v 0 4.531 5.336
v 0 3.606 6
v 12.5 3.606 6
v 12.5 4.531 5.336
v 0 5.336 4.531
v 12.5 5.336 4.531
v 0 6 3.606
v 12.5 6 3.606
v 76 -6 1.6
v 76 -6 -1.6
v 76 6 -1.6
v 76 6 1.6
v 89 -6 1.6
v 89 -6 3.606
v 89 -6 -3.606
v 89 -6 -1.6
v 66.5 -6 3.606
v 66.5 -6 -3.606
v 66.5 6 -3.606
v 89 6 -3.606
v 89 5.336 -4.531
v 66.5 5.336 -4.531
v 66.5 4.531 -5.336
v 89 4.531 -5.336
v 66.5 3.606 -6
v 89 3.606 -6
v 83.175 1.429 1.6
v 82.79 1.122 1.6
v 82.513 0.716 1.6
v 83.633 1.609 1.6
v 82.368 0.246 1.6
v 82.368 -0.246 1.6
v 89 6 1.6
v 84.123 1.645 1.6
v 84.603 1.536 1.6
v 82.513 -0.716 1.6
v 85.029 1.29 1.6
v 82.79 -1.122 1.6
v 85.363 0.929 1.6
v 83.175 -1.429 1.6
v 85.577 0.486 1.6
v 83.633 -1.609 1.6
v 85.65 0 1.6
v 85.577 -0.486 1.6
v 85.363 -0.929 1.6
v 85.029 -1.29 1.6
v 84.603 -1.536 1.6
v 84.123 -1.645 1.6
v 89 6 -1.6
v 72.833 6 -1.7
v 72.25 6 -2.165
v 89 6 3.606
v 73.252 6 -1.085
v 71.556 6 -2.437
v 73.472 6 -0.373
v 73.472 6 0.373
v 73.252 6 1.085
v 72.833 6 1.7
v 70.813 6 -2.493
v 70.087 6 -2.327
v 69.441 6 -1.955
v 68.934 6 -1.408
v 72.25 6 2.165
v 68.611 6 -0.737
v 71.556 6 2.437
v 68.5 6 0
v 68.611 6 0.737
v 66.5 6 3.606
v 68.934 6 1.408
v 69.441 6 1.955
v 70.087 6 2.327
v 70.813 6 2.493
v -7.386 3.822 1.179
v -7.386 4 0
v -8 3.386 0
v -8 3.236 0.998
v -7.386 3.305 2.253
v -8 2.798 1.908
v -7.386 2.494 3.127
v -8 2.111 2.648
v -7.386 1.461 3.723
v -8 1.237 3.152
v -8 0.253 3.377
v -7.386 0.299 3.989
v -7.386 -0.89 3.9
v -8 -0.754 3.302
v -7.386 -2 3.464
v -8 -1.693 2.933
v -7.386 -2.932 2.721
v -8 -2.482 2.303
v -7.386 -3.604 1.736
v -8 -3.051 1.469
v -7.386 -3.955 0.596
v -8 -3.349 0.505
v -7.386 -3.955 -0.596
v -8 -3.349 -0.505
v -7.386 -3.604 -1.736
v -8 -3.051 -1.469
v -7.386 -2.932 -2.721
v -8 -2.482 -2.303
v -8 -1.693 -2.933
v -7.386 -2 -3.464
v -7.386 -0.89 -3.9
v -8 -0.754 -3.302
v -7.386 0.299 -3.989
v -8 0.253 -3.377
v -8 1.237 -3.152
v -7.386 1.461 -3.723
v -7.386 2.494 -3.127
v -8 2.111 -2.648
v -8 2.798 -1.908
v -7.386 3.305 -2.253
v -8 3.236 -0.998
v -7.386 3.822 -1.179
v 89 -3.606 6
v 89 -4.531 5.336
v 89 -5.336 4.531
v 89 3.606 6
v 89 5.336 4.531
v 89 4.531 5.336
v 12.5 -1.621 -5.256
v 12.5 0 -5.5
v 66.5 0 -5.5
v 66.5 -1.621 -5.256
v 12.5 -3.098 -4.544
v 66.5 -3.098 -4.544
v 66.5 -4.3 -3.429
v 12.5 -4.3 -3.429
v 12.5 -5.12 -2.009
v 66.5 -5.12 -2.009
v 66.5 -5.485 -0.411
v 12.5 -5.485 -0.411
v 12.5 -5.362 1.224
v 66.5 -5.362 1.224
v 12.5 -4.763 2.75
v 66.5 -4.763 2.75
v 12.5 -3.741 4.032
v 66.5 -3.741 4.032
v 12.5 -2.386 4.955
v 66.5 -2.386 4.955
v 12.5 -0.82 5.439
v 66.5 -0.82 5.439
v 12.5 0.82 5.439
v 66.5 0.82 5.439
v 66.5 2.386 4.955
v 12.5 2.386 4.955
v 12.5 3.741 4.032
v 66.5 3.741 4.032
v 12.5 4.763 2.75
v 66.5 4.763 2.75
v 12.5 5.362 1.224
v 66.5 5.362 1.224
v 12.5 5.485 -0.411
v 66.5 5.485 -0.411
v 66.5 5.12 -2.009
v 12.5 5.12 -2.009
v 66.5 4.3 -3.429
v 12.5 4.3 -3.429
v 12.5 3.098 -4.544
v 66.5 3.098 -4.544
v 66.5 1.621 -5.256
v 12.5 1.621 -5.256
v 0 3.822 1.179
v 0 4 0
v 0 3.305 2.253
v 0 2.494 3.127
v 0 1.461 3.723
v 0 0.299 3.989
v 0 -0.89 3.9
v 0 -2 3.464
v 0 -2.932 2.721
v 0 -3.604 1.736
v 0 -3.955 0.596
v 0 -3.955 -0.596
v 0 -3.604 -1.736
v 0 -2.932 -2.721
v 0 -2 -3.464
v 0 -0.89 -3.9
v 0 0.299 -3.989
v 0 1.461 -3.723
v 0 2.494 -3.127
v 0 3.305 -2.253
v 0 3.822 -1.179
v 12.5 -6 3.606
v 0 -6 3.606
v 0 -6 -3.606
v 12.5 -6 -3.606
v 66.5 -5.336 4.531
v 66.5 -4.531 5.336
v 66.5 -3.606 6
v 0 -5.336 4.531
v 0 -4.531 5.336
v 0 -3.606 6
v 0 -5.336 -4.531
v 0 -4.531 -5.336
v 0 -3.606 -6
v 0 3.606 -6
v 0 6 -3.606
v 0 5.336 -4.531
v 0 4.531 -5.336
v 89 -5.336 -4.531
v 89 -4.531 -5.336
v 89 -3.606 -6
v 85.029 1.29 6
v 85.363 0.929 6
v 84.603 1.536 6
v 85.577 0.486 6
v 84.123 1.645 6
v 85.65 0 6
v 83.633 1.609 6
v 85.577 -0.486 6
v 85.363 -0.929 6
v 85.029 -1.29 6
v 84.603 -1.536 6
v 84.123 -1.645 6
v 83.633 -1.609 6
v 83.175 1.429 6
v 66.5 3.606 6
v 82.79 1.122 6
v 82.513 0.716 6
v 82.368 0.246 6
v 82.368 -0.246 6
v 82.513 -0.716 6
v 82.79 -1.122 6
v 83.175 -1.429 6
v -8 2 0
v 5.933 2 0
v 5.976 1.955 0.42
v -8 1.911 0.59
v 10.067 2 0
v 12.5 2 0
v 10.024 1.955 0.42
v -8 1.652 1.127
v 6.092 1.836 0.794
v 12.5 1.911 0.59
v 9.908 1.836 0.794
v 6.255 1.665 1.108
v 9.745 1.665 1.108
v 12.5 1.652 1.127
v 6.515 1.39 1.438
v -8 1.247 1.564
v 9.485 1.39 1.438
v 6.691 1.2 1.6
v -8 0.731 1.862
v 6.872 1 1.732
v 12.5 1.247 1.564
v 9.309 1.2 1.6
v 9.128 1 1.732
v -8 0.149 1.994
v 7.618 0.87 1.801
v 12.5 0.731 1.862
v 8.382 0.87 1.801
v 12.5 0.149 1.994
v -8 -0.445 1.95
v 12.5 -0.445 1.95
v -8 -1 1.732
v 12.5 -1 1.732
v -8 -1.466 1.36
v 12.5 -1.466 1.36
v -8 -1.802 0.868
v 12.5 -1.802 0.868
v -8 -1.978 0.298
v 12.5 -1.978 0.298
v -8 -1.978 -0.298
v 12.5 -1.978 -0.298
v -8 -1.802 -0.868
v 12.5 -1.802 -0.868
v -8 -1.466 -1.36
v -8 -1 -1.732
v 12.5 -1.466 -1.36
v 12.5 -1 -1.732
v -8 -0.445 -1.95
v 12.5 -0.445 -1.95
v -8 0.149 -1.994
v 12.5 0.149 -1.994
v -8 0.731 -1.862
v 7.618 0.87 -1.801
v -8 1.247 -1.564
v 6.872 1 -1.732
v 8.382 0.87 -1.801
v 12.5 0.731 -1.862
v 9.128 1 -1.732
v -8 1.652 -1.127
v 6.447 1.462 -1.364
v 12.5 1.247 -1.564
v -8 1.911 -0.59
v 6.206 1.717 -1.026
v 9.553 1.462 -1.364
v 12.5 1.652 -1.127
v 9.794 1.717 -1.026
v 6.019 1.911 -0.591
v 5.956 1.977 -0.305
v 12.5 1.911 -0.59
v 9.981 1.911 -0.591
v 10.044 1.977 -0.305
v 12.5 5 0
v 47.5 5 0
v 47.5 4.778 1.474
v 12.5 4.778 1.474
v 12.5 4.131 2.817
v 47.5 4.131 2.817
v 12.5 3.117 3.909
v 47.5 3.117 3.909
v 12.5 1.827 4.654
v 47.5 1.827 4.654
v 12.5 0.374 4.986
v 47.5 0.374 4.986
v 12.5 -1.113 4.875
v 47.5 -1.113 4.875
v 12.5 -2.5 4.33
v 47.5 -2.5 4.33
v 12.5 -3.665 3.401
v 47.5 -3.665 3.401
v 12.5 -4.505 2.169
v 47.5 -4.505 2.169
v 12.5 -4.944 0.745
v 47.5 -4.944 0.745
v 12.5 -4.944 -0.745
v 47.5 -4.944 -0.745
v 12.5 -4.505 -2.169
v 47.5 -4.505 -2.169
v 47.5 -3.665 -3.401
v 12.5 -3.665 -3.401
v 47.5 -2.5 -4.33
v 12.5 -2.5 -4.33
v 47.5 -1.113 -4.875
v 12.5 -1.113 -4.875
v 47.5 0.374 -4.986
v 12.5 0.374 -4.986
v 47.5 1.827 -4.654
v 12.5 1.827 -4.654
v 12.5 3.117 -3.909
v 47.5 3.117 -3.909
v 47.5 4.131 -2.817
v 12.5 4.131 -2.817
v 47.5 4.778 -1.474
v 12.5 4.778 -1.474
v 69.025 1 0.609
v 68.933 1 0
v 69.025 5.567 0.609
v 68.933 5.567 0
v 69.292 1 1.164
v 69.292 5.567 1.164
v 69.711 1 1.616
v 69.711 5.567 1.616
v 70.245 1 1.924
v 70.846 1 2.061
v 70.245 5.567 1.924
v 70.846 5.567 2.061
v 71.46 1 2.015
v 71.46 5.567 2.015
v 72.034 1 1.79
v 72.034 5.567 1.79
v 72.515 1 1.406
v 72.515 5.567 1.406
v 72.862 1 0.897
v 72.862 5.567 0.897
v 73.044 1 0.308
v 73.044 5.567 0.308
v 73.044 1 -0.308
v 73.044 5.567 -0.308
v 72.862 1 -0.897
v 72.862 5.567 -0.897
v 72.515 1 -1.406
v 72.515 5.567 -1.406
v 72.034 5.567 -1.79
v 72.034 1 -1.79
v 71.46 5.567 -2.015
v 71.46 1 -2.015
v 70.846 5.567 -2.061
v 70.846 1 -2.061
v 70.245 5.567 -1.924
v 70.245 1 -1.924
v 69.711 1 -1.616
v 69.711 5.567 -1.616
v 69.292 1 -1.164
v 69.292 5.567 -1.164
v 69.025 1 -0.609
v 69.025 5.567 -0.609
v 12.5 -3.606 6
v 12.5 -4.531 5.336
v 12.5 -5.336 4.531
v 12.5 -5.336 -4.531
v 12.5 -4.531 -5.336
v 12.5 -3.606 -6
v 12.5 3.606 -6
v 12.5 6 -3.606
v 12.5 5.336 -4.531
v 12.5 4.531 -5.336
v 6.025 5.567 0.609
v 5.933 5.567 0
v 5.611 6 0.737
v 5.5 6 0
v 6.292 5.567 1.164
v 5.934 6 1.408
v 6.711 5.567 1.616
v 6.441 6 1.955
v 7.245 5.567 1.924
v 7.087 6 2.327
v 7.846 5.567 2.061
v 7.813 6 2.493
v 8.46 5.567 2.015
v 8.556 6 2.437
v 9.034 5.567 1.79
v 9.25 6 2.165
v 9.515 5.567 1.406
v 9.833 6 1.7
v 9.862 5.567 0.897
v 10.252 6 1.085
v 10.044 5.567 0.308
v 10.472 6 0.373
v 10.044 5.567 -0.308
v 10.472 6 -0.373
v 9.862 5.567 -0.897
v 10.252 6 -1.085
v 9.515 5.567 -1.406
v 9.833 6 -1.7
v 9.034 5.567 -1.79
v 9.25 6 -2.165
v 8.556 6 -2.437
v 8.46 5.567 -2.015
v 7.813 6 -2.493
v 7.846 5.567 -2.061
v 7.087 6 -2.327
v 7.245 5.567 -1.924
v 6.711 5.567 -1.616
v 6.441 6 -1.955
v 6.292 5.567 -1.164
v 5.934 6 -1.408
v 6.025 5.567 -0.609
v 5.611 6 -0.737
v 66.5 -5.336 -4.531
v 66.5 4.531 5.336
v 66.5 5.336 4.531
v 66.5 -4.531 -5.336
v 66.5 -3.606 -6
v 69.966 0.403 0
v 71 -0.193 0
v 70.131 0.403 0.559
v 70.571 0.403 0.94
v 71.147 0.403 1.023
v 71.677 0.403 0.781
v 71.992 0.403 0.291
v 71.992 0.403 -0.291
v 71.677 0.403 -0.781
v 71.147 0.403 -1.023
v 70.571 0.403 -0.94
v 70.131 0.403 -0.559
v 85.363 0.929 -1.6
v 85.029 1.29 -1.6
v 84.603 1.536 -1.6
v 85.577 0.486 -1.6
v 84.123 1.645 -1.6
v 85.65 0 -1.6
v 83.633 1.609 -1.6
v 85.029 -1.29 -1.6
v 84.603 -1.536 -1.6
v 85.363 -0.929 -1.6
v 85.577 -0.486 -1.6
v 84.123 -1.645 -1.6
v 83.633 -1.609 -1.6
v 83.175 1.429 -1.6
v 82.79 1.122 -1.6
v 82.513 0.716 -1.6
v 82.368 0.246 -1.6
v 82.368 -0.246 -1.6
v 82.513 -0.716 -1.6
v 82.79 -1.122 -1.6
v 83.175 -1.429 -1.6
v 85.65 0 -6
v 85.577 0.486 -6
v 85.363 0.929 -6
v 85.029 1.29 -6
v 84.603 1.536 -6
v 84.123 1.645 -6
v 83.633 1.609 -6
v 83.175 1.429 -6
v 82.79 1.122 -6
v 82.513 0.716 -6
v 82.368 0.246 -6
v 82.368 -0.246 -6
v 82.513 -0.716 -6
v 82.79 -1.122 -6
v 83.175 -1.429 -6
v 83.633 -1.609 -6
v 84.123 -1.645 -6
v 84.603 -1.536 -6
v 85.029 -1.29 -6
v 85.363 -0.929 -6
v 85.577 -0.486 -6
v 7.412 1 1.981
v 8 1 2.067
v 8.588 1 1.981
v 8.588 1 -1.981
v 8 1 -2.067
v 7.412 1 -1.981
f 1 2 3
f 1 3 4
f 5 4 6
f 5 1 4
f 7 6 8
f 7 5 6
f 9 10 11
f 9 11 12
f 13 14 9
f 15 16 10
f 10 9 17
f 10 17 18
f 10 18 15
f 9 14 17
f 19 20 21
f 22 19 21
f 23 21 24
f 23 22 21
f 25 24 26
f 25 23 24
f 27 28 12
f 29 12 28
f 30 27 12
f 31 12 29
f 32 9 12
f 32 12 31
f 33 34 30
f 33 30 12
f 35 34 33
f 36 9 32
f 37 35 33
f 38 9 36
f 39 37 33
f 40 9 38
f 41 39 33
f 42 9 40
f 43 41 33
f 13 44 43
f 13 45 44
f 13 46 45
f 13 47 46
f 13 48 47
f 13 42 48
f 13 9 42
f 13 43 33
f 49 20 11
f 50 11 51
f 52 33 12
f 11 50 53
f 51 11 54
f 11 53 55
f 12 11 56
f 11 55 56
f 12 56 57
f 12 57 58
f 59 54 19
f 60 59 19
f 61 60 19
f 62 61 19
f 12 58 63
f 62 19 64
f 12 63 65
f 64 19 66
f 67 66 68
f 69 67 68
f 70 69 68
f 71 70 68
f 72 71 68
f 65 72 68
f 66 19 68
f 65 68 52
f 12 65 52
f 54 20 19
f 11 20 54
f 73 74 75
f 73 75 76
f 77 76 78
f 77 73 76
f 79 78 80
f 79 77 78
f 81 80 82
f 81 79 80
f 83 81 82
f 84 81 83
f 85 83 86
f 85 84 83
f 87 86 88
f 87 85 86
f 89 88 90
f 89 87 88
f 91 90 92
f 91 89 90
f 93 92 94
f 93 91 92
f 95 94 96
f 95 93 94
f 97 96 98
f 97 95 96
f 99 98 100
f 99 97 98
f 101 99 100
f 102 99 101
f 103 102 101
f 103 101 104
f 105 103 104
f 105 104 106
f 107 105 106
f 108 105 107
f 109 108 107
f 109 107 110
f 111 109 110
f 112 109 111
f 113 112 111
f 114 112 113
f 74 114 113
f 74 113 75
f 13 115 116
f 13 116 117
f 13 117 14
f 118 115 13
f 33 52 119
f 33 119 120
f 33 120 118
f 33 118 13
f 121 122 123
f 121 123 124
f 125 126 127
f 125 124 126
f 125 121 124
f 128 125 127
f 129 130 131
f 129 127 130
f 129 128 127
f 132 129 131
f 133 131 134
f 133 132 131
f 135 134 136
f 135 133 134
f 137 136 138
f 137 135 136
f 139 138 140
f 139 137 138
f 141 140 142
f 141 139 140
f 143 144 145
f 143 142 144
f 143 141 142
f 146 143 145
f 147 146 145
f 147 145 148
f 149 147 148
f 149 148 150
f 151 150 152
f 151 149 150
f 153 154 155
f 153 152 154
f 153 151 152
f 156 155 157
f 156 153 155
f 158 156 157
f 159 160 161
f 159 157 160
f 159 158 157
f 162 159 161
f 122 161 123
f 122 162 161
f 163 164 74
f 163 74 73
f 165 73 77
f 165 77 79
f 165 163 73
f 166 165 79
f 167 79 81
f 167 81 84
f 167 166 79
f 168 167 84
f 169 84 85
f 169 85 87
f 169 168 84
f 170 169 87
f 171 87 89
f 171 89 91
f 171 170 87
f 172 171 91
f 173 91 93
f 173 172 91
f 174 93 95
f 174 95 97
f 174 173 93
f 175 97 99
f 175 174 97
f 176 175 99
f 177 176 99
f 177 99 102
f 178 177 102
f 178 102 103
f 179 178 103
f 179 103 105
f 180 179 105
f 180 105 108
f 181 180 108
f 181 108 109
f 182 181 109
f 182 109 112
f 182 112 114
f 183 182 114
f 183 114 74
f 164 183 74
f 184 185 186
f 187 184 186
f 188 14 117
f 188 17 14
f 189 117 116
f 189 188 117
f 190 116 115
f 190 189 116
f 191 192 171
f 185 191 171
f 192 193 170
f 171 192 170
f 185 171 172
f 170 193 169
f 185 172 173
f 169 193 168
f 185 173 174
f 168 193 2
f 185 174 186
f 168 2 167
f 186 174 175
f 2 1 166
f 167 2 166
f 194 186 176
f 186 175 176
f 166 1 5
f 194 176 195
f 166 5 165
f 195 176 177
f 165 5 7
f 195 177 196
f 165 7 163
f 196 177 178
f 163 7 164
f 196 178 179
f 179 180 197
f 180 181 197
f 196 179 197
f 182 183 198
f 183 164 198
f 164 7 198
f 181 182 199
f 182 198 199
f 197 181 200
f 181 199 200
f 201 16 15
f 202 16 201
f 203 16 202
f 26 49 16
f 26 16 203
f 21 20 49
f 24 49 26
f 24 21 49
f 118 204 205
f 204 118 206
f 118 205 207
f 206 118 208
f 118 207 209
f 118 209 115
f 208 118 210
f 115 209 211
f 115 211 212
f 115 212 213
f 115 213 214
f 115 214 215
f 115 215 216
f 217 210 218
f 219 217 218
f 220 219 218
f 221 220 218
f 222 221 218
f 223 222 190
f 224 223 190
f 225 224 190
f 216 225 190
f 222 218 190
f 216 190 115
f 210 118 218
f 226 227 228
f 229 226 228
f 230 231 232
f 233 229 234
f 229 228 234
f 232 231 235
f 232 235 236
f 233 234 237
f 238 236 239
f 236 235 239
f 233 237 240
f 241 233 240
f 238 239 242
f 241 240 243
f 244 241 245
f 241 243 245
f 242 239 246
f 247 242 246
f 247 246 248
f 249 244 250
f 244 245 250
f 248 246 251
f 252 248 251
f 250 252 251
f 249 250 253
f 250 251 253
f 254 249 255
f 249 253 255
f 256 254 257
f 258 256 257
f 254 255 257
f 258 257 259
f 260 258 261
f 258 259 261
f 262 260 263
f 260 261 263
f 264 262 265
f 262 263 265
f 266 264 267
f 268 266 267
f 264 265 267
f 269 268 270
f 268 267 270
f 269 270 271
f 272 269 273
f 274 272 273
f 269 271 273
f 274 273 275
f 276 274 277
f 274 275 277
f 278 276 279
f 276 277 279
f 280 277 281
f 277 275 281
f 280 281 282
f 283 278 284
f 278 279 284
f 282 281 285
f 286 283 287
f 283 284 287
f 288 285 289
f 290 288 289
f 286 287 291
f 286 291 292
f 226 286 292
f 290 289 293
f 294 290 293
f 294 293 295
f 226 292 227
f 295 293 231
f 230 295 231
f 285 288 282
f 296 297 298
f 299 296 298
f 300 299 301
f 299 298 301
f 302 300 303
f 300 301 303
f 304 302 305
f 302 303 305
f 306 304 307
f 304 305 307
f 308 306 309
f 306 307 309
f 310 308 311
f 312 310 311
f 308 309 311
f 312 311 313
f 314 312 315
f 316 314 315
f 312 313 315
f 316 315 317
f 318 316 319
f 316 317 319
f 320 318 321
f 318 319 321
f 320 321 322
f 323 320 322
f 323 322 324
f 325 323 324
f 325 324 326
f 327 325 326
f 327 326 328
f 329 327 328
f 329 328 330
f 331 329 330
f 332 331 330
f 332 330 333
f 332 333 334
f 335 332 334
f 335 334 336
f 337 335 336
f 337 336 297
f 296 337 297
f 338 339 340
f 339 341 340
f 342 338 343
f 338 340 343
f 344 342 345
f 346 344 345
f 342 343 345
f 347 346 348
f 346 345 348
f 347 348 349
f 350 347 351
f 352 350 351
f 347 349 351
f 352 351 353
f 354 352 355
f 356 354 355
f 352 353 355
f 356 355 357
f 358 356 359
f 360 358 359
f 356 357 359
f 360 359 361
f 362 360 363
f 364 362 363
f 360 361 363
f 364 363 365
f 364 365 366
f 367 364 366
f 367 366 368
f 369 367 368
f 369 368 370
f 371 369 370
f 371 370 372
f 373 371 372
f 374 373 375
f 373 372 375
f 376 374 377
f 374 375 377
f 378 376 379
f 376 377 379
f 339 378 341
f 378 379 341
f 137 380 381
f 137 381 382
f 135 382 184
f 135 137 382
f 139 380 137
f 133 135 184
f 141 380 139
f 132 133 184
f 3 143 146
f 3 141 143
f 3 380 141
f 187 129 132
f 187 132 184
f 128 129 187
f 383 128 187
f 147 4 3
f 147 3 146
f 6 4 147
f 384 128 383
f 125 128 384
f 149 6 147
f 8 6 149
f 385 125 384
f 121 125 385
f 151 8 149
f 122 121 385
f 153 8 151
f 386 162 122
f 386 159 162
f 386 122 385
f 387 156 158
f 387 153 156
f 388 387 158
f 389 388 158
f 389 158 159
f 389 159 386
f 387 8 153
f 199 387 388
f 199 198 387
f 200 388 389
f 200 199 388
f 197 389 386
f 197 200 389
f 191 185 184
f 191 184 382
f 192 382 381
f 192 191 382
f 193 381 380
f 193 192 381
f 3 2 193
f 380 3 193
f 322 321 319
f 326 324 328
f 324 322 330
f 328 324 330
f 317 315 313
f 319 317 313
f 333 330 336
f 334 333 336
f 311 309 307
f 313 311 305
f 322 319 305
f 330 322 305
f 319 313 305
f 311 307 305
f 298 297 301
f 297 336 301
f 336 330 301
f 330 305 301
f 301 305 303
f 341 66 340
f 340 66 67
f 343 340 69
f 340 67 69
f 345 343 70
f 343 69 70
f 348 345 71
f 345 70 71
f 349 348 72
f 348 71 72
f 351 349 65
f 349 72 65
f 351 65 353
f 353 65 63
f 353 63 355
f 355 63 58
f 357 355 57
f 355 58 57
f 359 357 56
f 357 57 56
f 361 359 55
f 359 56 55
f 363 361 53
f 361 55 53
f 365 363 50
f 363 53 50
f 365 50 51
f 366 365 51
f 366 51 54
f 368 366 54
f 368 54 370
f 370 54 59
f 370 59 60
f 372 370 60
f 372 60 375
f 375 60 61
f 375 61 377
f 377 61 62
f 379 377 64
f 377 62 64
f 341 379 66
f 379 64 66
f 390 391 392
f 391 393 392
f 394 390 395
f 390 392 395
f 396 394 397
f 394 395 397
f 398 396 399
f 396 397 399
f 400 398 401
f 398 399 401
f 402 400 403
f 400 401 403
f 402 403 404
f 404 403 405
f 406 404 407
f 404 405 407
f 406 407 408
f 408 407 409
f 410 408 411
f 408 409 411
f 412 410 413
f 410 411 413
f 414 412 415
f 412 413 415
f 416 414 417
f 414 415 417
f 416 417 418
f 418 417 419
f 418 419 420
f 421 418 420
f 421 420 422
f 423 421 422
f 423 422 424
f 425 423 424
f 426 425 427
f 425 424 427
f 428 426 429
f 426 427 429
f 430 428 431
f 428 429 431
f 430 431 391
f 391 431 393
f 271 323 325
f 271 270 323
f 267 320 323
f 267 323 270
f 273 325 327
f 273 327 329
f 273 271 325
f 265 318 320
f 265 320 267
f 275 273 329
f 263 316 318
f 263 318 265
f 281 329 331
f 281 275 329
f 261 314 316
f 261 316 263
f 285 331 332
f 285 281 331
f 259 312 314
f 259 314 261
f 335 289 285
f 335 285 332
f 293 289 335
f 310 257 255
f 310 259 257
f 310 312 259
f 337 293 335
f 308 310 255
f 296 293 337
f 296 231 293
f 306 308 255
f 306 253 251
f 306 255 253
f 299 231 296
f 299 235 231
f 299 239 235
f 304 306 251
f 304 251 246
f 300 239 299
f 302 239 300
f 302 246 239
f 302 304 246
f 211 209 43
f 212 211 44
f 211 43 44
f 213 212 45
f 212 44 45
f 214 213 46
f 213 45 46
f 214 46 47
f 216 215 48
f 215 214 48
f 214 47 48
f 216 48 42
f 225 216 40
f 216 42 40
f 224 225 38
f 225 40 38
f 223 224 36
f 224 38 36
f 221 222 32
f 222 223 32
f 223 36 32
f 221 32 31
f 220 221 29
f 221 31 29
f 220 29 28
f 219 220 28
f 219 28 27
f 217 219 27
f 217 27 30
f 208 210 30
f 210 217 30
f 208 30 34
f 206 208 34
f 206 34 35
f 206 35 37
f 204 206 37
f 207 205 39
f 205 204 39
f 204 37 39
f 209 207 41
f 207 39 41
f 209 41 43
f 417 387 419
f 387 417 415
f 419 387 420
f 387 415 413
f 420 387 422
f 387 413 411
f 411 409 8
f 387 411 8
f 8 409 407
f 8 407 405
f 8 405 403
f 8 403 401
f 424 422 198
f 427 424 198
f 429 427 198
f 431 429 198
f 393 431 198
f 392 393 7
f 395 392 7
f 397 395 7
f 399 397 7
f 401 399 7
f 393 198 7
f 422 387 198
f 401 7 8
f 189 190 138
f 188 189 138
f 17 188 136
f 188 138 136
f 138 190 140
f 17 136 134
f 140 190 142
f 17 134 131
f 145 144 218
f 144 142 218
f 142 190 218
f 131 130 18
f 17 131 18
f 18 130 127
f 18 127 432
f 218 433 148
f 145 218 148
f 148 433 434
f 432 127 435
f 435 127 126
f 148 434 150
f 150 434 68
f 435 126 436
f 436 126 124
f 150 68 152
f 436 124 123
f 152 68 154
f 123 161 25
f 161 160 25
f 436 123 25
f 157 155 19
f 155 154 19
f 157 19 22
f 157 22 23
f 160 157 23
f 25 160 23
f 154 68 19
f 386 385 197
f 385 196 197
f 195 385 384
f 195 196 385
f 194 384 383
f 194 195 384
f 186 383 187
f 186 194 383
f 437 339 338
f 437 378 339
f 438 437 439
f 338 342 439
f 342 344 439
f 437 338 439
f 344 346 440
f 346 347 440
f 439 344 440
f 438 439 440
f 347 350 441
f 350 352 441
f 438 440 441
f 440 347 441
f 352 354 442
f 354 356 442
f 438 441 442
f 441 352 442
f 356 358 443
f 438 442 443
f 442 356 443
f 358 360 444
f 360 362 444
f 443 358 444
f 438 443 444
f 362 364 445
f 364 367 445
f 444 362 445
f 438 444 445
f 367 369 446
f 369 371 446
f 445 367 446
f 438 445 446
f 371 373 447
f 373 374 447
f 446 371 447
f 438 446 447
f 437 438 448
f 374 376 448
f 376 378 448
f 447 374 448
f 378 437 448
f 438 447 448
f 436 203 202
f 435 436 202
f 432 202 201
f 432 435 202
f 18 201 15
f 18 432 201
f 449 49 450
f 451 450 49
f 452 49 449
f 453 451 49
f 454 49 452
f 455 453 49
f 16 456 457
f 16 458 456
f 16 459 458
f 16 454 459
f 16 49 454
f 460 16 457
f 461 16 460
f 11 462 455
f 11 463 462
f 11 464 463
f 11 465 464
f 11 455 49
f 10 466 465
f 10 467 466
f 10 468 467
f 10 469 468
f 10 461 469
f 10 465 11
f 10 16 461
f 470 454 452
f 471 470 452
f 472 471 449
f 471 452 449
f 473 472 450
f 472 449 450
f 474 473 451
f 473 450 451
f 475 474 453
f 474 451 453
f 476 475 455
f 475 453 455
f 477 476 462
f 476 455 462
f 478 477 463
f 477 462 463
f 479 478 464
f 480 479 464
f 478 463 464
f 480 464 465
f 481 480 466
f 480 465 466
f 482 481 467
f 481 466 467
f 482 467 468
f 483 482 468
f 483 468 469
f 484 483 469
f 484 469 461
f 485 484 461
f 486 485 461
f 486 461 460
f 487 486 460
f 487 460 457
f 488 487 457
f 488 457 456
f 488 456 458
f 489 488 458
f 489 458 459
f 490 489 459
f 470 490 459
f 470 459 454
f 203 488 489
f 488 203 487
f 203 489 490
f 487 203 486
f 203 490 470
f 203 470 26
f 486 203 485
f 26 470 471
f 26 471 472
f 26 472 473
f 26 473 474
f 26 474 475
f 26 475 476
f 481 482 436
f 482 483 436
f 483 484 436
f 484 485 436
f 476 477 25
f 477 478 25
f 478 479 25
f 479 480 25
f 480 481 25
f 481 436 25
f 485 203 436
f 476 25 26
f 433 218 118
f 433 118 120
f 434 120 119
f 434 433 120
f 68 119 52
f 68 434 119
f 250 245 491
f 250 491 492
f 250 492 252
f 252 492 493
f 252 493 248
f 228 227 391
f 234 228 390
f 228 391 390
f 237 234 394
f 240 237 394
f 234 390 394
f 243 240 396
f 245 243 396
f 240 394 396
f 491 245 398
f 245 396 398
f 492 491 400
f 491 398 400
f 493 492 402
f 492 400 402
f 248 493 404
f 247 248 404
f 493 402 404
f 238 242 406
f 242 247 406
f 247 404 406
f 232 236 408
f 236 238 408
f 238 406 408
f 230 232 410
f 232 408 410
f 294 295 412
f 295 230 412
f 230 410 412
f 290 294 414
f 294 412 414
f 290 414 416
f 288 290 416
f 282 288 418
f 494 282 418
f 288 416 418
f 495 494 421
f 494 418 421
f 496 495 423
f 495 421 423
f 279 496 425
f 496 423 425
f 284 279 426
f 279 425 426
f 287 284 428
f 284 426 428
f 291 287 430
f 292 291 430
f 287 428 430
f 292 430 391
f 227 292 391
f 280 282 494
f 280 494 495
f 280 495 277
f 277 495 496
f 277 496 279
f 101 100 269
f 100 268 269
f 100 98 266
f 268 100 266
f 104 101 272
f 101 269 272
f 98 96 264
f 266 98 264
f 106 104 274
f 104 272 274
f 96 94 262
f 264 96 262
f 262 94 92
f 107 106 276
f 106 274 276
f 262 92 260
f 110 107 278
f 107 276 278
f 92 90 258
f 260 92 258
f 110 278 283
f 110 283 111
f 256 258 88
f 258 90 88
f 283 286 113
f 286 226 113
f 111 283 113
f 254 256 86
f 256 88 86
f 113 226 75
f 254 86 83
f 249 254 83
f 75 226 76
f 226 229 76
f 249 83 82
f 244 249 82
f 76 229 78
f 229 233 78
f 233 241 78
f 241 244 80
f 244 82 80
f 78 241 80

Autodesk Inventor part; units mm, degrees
sketch "Sketch_8" plane through (0, 0, 0) normal (0, 0, 1) x (1, 0, 0)
  line L0 (0, 0) -> (-8, 0)
  line L1 (-8, 0) -> (-8, 3.3865)
  line L2 (-8, 3.3865) -> (-7.3865, 4)
  line L3 (-7.3865, 4) -> (0, 4)
  line L4 (0, 4) -> (0, 0)
  line L5 (0, 0) -> (-8, 0)
revolve "Revolution1" add sketch "Sketch_8" angle 360 about axis through (0, 0, 0) along (1, 0, 0)
thread "Thread1" size "M8x1" class "6g" standard "ISO Metric profile" length 5.8865
sketch "Sketch_9" plane through (0, 0, 0) normal (1, 0, 0) x (0, 0, -1)
  line L0 (-6, 3.6056) -> (-6, -3.6056)
  arc A0 (-6, -3.6056) -> (-3.6056, -6) centre (0, 0) ccw
  line L1 (-3.6056, -6) -> (3.6056, -6)
  arc A1 (3.6056, -6) -> (6, -3.6056) centre (0, 0) ccw
  line L2 (6, -3.6056) -> (6, 3.6056)
  arc A2 (6, 3.6056) -> (3.6056, 6) centre (0, 0) ccw
  line L3 (3.6056, 6) -> (-3.6056, 6)
  arc A3 (-3.6056, 6) -> (-6, 3.6056) centre (0, 0) ccw
extrude "Extrusion1" add sketch "Sketch_9" along normal blind 12.5
sketch "Sketch_6" plane through (12.5, 0, 0) normal (1, 0, 0) x (0, 0, -1)
  circle A0 centre (0, 0) radius 5.5
extrude "Extrusion2" add sketch "Sketch_6" along normal blind 54
sketch "Sketch_10" plane through (66.5, 0, 0) normal (1, 0, 0) x (0, 0, -1)
  line L0 (-6, 3.6056) -> (-6, -3.6056)
  arc A0 (-6, -3.6056) -> (-3.6056, -6) centre (0, 0) ccw
  line L1 (-3.6056, -6) -> (3.6056, -6)
  arc A1 (3.6056, -6) -> (6, -3.6056) centre (0, 0) ccw
  line L2 (6, -3.6056) -> (6, 3.6056)
  arc A2 (6, 3.6056) -> (3.6056, 6) centre (0, 0) ccw
  line L3 (3.6056, 6) -> (-3.6056, 6)
  arc A3 (-3.6056, 6) -> (-6, 3.6056) centre (0, 0) ccw
extrude "Extrusion3" add sketch "Sketch_10" along normal blind 22.5
sketch "Sketch7" plane through (0, 0, 0) normal (0, 0, 1) x (1, 0, 0)
  line L0 (8, 6) -> (8, 1)
  line L1 (8, -0.1934) -> (5.933, 1)
  line L2 (5.933, 1) -> (5.933, 5.567)
  line L3 (5.933, 5.567) -> (5.5, 6)
  line L4 (5.5, 6) -> (8, 6)
  line L5 (8, 6) -> (8, -0.1934)
revolve "Revolution2" cut sketch "Sketch7" angle 360 about axis through (8, 6, 0) along (0, 1, 0)
thread "Thread2" size "M5x0.8" class "6H" standard "ISO Metric profile" full length
sketch "Sketch_7" plane through (0, 0, 0) normal (0, 0, 1) x (1, 0, 0)
  line L0 (71, 6) -> (71, 1)
  line L1 (71, -0.1934) -> (68.933, 1)
  line L2 (68.933, 1) -> (68.933, 5.567)
  line L3 (68.933, 5.567) -> (68.5, 6)
  line L4 (68.5, 6) -> (71, 6)
  line L5 (71, 6) -> (71, -0.1934)
revolve "Revolution3" cut sketch "Sketch_7" angle 360 about axis through (71, 6, 0) along (0, 1, 0)
thread "Thread3" size "M5x0.8" class "6H" standard "ISO Metric profile" full length
sketch "Sketch_16" plane through (0, 0, 0) normal (0, 0, 1) x (1, 0, 0)
  line L0 (47.5, 0) -> (-8, 0)
  line L1 (-8, 0) -> (-8, 2)
  line L2 (-8, 2) -> (12.5, 2)
  line L3 (12.5, 2) -> (12.5, 5)
  line L4 (12.5, 5) -> (47.5, 5)
  line L5 (47.5, 5) -> (47.5, 0)
  line L6 (47.5, 0) -> (-8, 0)
revolve "Revolution4" cut sketch "Sketch_16" angle 360 about axis through (47.5, 0, 0) along (1, 0, 0)
sketch "Sketch_3" plane through (0, 0, 0) normal (0, 1, 0) x (-1, 0, 0)
  line L0 (-76, 1.6) -> (-89, 1.6)
  line L1 (-89, 1.6) -> (-89, -1.6)
  line L2 (-89, -1.6) -> (-76, -1.6)
  line L3 (-76, -1.6) -> (-76, 1.6)
extrude "Extrusion4" cut sketch "Sketch_3" along normal mid plane 12
sketch "Sketch_13" plane through (0, 0, 0) normal (0, 0, 1) x (1, 0, 0)
  circle A0 centre (84, 0) radius 1.65
extrude "Extrusion5" cut sketch "Sketch_13" along normal mid plane 12
ref_plane "BODY_N_XY" through (84, 0, 0) normal (0, 0, -1) x (1, 0, 0)
ref_plane "BODY_N_YZ" through (84, 0, 0) normal (1, 0, 0) x (0, -1, 0)
ref_plane "BODY_N_ZX" through (84, 0, 0) normal (0, -1, 0) x (0, 0, -1)
ref_plane "BODY_PIN_XY" through (84, 0, 0) normal (-1, 0, 0) x (0, 0, -1)
ref_plane "BODY_PIN_YZ" through (84, 0, 0) normal (0, 0, -1) x (0, -1, 0)
ref_plane "BODY_PIN_ZX" through (84, 0, 0) normal (0, -1, 0) x (-1, 0, 0)
ref_plane "NUT2_XY" through (76, 0, 0) normal (1, 0, 0) x (0, 0, -1)
ref_plane "NUT2_YZ" through (76, 0, 0) normal (0, 0, -1) x (0, 1, 0)
ref_plane "NUT2_ZX" through (76, 0, 0) normal (0, 1, 0) x (1, 0, 0)
ref_plane "SW1_XY" through (17, 0, 0) normal (1, 0, 0) x (0, 0, -1)
ref_plane "SW1_YZ" through (17, 0, 0) normal (0, 0, -1) x (0, 1, 0)
ref_plane "SW1_ZX" through (17, 0, 0) normal (0, 1, 0) x (1, 0, 0)
ref_plane "SW2_XY" through (62, 0, 0) normal (-1, 0, 0) x (0, 0, -1)
ref_plane "SW2_YZ" through (62, 0, 0) normal (0, 0, -1) x (0, -1, 0)
ref_plane "SW2_ZX" through (62, 0, 0) normal (0, -1, 0) x (-1, 0, 0)
ref_plane "SW_R1_XY" through (17, -11, 0) normal (1, 0, 0) x (0, 0, -1)
ref_plane "SW_R1_YZ" through (17, -11, 0) normal (0, 0, -1) x (0, 1, 0)
ref_plane "SW_R1_ZX" through (17, -11, 0) normal (0, 1, 0) x (1, 0, 0)
ref_plane "SW_R2_XY" through (62, -11, 0) normal (-1, 0, 0) x (0, 0, -1)
ref_plane "SW_R2_YZ" through (62, -11, 0) normal (0, 0, -1) x (0, -1, 0)
ref_plane "SW_R2_ZX" through (62, -11, 0) normal (0, -1, 0) x (-1, 0, 0)
ref_plane "body_XY" through (0, 0, 0) normal (-1, 0, 0) x (0, 0, -1)
ref_plane "body_YZ" through (0, 0, 0) normal (0, 0, -1) x (0, -1, 0)
ref_plane "body_ZX" through (0, 0, 0) normal (0, -1, 0) x (-1, 0, 0)
properties part number "CJ2D10-30Z(1_0)_BODY"
